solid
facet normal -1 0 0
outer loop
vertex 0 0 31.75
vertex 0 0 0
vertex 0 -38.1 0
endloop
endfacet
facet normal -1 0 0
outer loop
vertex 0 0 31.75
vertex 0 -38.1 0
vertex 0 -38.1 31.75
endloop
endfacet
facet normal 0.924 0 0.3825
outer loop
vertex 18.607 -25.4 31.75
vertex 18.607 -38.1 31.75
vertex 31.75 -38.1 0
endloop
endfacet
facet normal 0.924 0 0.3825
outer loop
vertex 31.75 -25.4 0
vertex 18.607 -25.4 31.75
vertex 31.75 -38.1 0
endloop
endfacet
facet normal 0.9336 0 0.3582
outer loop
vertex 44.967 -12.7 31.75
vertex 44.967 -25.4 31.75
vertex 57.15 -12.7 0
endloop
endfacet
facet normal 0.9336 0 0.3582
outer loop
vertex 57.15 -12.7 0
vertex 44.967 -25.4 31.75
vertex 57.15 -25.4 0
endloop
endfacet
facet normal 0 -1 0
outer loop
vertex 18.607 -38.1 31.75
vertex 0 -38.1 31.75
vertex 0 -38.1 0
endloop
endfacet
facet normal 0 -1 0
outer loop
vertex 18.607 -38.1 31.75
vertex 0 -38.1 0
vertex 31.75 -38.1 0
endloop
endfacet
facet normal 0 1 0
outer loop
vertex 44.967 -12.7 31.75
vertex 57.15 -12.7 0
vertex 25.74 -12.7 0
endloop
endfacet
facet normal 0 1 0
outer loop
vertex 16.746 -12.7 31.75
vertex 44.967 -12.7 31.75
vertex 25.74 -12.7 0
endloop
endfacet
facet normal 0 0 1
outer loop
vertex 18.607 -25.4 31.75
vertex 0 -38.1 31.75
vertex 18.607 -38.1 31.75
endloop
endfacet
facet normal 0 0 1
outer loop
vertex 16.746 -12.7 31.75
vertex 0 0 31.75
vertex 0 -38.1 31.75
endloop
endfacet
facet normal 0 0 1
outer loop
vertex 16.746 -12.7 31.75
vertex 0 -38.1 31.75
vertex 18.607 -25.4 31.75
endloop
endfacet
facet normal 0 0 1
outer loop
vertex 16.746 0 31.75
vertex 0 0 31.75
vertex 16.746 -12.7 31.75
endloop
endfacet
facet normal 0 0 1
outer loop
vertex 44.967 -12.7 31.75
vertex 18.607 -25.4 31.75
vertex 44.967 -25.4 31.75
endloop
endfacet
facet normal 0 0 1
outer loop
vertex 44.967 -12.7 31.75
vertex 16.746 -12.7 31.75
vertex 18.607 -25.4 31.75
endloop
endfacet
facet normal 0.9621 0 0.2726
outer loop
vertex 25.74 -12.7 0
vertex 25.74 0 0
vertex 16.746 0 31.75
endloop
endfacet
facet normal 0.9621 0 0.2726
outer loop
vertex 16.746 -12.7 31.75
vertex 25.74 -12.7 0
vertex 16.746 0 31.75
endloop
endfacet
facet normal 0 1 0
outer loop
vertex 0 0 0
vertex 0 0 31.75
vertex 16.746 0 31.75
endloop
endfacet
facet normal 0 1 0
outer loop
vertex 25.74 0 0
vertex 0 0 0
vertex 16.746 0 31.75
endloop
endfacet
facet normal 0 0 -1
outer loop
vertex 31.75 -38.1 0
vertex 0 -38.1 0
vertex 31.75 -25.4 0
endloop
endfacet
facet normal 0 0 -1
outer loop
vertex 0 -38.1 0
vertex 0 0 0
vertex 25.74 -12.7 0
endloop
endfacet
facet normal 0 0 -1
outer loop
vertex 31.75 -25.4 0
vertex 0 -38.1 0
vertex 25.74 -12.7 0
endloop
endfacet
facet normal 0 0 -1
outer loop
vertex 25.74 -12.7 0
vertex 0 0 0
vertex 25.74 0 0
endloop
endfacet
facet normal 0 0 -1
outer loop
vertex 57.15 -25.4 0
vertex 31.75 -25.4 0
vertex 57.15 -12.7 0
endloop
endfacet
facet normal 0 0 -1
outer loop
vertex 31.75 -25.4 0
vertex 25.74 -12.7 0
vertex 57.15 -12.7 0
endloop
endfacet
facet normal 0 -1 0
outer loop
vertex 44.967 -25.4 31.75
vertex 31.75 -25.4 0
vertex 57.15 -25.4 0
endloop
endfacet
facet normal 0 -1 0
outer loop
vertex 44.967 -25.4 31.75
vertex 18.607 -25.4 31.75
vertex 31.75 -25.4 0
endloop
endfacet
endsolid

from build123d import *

# Parameters (mm, degrees)
F0_W     = 57.15
F0_H     = 31.75
F1_DEPTH = 38.1
F3_DEPTH = 12.7
F5_DEPTH = 38.1
F7_DEPTH = 12.7


with BuildPart() as f1:
    # F0 (on Front) → F1 (new body)
    with BuildSketch(Plane.XZ):
        with Locations((28.575, 15.875)):
            Rectangle(F0_W, F0_H)
    extrude(amount=F1_DEPTH)

    # F2 (on face) → F3 (cut)
    with BuildSketch(Plane.XZ.offset(38.1)):
        Polygon((31.75, 0), (57.15, 0), (44.966862, 31.75), (18.606976, 31.75), align=None)
    extrude(amount=-F3_DEPTH, mode=Mode.SUBTRACT)

    # F4 (on face) → F5 (cut)
    with BuildSketch(Plane.XZ.offset(38.1)):
        Polygon((57.15, 0), (57.15, 31.75), (44.966862, 31.75), align=None)
    extrude(amount=-F5_DEPTH, mode=Mode.SUBTRACT)

    # F6 (on face) → F7 (cut)
    with BuildSketch(Plane(origin=(0, 0, 0), x_dir=(-1, 0, 0), z_dir=(0, 1, 0))):
        Polygon((-25.739651, 0), (-16.746279, 31.75), (-44.966862, 31.75), (-57.15, 0), align=None)
    extrude(amount=-F7_DEPTH, mode=Mode.SUBTRACT)


solid = f1.part
